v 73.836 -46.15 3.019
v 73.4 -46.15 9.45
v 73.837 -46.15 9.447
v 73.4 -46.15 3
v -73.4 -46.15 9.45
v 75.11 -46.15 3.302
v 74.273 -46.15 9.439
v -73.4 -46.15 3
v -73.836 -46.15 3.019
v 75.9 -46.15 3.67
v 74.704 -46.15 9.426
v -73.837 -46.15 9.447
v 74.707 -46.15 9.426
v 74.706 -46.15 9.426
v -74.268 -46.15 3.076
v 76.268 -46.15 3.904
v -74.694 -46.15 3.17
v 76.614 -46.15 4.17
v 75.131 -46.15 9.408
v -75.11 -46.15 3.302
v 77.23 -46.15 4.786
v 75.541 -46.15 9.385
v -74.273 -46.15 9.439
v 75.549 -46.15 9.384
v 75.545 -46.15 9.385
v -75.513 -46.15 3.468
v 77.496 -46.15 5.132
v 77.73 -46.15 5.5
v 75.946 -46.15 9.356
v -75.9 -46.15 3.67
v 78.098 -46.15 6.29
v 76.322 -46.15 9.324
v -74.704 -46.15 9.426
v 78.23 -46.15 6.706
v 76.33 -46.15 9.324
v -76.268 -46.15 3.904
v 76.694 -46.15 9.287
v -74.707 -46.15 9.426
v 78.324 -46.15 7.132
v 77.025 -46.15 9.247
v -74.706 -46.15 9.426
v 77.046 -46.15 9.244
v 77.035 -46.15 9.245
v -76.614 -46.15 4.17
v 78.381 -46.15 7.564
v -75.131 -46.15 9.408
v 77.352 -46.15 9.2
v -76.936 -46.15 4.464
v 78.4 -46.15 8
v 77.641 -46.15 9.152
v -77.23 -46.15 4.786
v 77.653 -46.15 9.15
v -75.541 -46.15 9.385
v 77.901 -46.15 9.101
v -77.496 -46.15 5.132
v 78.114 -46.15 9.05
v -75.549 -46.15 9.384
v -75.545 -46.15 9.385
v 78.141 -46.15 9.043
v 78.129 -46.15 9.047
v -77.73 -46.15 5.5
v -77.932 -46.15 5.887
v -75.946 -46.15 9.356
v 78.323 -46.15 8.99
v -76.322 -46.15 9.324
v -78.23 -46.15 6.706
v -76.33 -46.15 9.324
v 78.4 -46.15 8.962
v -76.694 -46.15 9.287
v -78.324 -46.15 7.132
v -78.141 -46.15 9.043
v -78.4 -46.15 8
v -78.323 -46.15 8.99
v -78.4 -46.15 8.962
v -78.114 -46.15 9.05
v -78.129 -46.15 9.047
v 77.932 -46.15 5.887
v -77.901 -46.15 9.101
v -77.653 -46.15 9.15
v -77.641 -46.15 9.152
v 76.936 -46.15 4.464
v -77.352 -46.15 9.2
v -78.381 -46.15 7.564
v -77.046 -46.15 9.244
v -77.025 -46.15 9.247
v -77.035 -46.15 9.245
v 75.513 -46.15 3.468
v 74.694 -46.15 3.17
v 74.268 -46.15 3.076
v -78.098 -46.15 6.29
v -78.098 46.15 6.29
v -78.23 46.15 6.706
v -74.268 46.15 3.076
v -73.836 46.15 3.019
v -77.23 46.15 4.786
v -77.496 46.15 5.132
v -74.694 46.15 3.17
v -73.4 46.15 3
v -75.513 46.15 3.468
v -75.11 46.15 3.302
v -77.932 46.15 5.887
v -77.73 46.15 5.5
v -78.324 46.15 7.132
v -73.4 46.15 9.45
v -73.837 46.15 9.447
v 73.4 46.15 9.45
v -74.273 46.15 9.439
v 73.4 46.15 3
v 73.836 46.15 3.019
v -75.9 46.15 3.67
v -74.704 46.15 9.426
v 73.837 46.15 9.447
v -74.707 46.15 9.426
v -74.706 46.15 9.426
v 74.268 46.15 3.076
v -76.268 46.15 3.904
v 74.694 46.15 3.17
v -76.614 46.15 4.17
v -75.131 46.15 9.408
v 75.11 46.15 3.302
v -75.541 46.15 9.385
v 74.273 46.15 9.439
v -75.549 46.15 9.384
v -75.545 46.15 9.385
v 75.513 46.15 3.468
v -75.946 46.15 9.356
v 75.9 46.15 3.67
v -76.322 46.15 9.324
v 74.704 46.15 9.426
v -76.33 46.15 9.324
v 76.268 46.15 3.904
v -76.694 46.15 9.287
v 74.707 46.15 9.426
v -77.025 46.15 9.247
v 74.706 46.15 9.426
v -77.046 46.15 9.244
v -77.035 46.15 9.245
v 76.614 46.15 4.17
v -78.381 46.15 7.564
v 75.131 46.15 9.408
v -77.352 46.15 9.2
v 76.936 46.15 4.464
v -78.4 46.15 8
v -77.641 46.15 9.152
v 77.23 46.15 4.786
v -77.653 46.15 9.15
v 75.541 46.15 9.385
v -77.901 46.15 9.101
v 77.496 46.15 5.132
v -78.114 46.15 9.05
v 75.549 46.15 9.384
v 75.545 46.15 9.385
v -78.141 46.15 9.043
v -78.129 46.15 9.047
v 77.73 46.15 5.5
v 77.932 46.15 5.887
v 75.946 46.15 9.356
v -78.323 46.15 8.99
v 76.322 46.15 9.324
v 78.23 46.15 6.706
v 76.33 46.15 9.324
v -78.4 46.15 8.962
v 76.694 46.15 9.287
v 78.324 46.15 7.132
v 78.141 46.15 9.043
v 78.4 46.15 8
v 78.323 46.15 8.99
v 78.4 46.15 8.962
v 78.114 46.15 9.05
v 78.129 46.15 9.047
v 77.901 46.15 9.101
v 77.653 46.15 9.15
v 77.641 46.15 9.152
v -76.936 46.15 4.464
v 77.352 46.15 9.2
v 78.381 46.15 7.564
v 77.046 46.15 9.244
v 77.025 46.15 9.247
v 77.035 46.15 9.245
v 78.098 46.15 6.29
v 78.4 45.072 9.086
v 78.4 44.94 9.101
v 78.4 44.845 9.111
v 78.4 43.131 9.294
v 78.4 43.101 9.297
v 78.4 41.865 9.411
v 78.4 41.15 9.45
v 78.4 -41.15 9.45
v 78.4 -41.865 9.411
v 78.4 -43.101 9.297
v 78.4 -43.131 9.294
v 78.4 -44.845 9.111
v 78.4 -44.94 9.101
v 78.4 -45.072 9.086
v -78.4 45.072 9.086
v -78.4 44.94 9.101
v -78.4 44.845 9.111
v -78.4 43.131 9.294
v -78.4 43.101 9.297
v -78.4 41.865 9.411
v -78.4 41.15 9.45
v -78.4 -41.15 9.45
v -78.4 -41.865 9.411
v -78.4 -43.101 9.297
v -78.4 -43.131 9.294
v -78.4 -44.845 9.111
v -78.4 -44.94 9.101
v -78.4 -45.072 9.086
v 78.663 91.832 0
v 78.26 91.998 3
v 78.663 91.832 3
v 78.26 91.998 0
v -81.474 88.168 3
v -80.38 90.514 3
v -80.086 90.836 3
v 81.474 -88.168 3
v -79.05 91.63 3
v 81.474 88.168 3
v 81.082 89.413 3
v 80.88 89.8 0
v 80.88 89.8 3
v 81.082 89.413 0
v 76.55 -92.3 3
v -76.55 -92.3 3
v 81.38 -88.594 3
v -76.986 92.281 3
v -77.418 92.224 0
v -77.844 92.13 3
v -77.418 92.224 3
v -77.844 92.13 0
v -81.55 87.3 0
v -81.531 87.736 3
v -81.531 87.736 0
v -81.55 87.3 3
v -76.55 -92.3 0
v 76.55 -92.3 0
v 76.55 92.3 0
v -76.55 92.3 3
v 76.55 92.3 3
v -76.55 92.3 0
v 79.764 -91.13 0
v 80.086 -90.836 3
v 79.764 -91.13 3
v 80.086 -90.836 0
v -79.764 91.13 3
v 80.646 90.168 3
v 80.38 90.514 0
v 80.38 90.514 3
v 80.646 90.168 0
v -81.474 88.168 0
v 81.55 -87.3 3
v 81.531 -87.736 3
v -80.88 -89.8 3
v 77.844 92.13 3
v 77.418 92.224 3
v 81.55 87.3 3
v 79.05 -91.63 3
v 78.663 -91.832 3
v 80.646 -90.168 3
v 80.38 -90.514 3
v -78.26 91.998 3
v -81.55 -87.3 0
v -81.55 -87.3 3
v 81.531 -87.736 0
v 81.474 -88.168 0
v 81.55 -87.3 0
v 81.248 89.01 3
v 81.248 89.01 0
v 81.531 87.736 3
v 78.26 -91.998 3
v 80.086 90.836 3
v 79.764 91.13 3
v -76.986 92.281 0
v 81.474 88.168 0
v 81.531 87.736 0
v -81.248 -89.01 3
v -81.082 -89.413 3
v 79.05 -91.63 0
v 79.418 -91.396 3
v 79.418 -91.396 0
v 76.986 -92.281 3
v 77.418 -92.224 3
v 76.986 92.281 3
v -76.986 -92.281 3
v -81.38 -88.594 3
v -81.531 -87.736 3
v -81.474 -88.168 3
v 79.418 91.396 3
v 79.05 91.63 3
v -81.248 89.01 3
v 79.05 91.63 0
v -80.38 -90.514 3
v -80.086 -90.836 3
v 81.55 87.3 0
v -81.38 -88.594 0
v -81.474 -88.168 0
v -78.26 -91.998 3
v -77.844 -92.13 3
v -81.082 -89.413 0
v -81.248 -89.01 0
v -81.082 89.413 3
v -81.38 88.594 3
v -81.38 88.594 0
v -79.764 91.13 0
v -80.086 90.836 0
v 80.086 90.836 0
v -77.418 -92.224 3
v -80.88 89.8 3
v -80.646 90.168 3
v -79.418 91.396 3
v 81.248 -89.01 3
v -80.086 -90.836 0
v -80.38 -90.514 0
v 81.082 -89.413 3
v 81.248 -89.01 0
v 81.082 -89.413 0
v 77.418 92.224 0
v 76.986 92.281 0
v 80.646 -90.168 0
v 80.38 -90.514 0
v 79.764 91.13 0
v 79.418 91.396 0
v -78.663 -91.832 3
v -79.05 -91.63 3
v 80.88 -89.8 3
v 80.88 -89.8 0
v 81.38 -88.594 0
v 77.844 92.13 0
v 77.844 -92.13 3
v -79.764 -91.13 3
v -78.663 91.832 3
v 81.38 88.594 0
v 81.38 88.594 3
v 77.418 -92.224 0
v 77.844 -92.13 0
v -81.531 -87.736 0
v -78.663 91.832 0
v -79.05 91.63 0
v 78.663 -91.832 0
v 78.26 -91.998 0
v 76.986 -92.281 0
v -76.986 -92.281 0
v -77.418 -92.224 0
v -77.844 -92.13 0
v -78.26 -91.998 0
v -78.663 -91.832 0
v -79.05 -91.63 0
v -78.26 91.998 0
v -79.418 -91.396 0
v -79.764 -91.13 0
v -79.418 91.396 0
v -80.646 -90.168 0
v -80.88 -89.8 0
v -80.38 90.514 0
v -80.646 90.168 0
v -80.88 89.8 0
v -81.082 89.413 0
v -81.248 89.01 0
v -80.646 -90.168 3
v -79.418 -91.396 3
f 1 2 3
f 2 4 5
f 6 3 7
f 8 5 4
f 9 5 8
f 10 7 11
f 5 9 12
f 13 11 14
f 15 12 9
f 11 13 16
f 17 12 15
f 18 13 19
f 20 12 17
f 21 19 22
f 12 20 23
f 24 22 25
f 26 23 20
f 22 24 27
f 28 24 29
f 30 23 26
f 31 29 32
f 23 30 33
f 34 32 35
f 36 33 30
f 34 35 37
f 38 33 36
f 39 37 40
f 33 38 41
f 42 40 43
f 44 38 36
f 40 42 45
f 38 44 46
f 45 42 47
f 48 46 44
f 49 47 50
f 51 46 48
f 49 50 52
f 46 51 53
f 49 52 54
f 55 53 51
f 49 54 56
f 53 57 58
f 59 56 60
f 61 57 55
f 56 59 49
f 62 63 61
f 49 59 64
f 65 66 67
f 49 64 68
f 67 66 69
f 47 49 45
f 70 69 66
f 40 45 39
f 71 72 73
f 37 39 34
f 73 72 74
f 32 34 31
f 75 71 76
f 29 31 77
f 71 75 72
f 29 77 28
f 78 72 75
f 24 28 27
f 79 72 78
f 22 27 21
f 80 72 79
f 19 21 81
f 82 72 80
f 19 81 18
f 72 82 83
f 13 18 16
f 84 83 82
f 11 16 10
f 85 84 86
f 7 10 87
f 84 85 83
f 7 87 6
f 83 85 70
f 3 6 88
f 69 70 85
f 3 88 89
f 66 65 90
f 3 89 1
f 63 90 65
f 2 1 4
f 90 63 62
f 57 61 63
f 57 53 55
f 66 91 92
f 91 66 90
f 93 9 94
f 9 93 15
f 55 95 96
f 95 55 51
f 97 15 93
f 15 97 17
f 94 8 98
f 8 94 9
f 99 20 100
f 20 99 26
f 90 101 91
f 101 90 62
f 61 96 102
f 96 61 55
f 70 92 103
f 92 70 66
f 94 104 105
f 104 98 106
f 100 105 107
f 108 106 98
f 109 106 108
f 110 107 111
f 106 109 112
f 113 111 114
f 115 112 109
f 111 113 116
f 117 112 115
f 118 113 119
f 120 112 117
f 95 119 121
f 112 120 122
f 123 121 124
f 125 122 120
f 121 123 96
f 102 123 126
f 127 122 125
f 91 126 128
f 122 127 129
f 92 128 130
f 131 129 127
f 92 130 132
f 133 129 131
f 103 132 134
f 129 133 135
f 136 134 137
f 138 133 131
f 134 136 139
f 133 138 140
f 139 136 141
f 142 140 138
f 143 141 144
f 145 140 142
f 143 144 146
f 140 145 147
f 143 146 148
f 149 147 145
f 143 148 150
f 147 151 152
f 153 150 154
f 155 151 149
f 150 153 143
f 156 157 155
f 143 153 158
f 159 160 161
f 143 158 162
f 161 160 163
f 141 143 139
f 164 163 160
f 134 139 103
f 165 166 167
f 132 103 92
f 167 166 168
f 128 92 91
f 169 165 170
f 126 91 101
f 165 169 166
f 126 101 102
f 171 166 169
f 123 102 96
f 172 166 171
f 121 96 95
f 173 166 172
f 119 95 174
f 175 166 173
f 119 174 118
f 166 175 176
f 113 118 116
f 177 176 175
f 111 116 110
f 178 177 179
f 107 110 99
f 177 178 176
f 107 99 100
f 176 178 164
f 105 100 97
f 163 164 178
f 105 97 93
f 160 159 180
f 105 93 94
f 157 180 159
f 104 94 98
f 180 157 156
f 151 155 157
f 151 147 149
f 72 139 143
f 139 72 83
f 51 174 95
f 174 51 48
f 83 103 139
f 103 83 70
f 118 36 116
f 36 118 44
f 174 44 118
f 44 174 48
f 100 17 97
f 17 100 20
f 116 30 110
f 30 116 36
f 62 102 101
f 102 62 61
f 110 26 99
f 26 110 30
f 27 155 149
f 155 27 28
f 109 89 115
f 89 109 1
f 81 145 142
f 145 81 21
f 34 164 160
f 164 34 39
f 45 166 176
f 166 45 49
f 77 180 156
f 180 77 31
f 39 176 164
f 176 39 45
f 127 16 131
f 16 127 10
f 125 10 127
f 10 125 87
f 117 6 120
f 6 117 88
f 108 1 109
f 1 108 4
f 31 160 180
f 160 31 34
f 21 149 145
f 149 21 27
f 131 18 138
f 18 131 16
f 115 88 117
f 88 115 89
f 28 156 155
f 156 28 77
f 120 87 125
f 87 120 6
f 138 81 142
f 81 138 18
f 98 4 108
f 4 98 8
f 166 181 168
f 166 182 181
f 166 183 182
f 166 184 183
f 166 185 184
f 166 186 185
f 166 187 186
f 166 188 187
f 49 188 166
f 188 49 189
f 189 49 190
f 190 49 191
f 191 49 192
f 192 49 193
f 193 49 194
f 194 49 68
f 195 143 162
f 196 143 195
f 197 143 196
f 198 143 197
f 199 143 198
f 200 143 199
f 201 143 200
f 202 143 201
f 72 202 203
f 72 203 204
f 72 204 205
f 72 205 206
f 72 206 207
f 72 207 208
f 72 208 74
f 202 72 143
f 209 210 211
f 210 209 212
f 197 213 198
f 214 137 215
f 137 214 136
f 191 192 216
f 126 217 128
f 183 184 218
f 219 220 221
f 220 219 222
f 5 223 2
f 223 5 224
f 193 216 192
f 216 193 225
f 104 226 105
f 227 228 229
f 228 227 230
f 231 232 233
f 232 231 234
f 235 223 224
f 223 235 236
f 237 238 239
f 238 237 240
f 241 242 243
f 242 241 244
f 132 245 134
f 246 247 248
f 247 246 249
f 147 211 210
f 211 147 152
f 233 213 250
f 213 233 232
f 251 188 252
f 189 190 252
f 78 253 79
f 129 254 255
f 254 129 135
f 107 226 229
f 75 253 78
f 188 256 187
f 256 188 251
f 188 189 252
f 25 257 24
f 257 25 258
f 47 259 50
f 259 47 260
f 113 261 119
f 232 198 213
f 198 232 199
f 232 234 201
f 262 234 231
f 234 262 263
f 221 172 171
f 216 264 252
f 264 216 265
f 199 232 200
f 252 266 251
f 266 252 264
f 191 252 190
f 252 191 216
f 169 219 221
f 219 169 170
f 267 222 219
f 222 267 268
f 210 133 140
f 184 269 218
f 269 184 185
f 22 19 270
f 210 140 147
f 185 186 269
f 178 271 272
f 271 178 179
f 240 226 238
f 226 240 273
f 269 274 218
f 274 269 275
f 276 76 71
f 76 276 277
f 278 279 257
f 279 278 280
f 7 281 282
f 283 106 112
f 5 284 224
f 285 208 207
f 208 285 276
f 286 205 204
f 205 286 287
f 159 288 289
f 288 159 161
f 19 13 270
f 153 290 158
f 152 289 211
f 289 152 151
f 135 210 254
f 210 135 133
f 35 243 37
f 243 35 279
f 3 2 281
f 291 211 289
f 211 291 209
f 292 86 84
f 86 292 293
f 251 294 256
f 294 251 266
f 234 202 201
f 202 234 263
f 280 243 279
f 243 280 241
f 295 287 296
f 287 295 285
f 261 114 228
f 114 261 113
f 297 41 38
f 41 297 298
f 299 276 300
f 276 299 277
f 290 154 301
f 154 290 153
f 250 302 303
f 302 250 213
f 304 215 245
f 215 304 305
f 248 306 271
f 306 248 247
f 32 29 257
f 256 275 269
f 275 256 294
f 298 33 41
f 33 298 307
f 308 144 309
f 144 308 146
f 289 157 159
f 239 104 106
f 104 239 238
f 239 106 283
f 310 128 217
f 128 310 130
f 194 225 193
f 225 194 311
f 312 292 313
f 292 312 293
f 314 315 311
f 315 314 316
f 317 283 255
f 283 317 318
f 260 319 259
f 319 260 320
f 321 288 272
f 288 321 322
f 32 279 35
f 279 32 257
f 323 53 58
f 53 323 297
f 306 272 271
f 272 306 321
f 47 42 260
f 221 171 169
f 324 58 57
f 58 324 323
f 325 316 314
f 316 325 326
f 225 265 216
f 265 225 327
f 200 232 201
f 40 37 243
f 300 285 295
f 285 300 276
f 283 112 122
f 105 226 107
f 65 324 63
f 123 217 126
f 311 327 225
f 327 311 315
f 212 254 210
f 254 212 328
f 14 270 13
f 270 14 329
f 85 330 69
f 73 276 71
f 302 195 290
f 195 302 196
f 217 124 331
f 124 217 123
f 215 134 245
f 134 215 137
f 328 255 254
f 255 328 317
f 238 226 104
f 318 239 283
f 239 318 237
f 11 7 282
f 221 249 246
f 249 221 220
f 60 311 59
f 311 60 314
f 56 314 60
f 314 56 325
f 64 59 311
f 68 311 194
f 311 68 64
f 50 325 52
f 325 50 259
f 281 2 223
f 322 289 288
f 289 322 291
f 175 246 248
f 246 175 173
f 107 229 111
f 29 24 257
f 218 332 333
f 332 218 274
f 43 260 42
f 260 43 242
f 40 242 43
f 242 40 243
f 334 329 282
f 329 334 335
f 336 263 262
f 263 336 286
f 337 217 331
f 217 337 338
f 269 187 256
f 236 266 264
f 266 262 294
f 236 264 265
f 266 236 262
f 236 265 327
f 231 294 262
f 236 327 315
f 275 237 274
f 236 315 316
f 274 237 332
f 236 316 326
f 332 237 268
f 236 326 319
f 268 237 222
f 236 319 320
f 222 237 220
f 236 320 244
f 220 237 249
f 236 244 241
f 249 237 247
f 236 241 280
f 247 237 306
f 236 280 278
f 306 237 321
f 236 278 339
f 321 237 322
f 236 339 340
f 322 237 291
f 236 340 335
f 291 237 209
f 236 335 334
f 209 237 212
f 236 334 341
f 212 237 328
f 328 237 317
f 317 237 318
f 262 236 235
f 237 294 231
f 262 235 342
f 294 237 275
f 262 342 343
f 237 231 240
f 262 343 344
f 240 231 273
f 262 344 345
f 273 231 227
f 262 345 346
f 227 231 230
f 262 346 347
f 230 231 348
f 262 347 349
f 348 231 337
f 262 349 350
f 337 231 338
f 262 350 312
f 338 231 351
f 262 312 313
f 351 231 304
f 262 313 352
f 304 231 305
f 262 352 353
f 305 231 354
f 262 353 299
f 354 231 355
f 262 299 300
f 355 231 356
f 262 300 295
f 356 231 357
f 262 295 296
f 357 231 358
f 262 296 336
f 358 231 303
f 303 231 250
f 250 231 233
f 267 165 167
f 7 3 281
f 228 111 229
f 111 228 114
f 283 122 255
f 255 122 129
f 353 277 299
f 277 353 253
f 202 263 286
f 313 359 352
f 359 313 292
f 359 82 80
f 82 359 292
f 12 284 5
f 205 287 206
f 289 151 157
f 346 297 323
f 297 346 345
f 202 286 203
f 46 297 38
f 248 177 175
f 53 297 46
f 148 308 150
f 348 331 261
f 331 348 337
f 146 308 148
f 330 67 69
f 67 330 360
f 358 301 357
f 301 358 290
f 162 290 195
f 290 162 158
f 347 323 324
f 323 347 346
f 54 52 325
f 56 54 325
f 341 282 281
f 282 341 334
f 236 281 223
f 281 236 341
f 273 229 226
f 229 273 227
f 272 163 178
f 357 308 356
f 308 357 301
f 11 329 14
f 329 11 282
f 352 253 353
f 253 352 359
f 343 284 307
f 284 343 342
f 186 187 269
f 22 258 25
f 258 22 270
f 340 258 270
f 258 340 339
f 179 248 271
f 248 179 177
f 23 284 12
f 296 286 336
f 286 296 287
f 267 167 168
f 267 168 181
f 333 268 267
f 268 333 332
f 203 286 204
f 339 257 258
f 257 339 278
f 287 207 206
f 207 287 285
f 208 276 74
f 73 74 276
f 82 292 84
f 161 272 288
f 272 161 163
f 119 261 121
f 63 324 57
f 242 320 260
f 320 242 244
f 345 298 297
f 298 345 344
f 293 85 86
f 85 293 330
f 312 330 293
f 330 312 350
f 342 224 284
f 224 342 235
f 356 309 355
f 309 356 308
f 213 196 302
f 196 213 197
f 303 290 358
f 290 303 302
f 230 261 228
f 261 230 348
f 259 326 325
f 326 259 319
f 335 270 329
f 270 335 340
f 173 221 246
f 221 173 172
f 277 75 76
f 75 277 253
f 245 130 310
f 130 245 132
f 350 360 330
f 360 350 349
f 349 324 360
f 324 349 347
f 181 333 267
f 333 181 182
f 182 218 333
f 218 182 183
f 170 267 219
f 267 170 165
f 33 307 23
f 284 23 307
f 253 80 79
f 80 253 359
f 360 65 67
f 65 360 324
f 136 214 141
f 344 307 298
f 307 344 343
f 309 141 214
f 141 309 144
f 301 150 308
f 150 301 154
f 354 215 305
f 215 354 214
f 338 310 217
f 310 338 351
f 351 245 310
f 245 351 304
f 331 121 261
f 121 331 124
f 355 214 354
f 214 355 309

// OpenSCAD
/*
    A Base for Radio Mounting Tower for Ham Radios
    Author: porcej@gmail.com
    Date: November 6, 2017

*/

// Arbitrary dimensions
thickness = 3; // Thicknesses of walls, etc.
quality=72; // "Roundness" of circles.
tolerances = 0.15; // Something to add for shrinkage
compensate = .6; // Multiplier "fudging" constant for shrinkage compensation
corner_radius = 5; // radius of tower's corners

// Screw dimensions
m4 = 4 + (2 * (tolerances + compensate)); // Diameter of M4 screw shaft
m5 = 5 + (2 * (tolerances + compensate)); // Diameter of M5 screw shaft
// Radio dimensions
radio_count = 2; // Number of radios on tower
radio_width = 150.5; // Width of radio
radio_height = 39.5; // Height of radio
radio_screw_spaceing = 50; // Spaceing between mounting screws on radio

// Tower Dimensions
tower_width = radio_width + (2 * (tolerances + thickness)); // Overall width od tower (X)
tower_height = radio_count * (1.75 * (radio_height + tolerances)) + (2 * thickness); // Overall height of tower (Y)
tower_depth = (1.5 * radio_screw_spaceing) + (2 * (thickness + tolerances + m4)); // Depth of tower (Z)

// Base Dimensions
base_depth = 2 * tower_depth;
base_height = 3 * (tolerances + thickness);
base_width = tower_width + 2 * (tolerances + thickness);


include <MCAD/boxes.scad>
$fn = quality;

difference(){
    towerBase();
    translate([0,0,thickness + tower_height / 2]) rotate([90,0,0]) solidRadioTower();
}   // end of difference

module towerBase(){
    hull(){
        translate([0,0,thickness / 2])
            roundedBox([base_width, base_depth, thickness], corner_radius, true);
        translate([0,0, base_height / 2])
            roundedBox([tower_width, tower_depth, base_height], corner_radius, true);
    }   // end of hull
    
}   // towerBase();

module solidRadioTower(){    
    roundedBox([tower_width, tower_height, tower_depth], corner_radius, true);
}   // solidRadioTower()



module radioTower(){    
    difference(){
        // First we create the tower has a box with rounded corners
        solidRadioTower();
        
        
        base_offset = -tower_height / 2 + thickness;   
        
        // Loop over all of the radio bays to add mounting screw holes
        for (radio = [0:radio_count-1]) {
            mounting_hole_y = base_offset + ((1 + 1.5 * radio) * (radio_height + tolerances));
            // Then we cut out the rear screw holes
            translate([0,mounting_hole_y,-radio_screw_spaceing / 2])
            rotate([0,90,0])
            cylinder(h=tower_width, r=m4 / 2, center=true);
            
            // Next the front screw "trench"
            translate([0,mounting_hole_y,radio_screw_spaceing / 2])
            rotate([0,90,0])
            hull(){
                translate([-radio_screw_spaceing / 8,0,0]) cylinder(h=tower_width, r=m4 / 2, center=true);
                translate([radio_screw_spaceing / 8,0,0]) cylinder(h=tower_width, r=m4 / 2, center=true);
            }   // end of hull
        }   // end of for
        
        // Remove the top and bottom mounting bracket slots
        rotate([90,0,0]) cylinder(h=tower_height, r=m5/2, center=true); 
        translate([-radio_width/4,0,-tower_height/4]) mountingSlots();
        translate([-radio_width/4,0,tower_height/4]) mountingSlots();
        translate([radio_width/4,0,-tower_height/4]) mountingSlots();
        translate([radio_width/4,0,tower_height/4]) mountingSlots();
        
        // Next we create the inner box and remove it from the outterbox
        roundedBox([tower_width - (2 * thickness), tower_height - ( 2 * thickness), tower_depth], corner_radius, true);
    }   // end of difference
}   // radioTower()


module mountingSlots(){
    rotate([90,0,0])
    hull(){ 
        translate([-radio_width/10,0,0])
            cylinder(h=tower_height, r=m5/2, center=true);
        translate([radio_width/10,0,0])
            cylinder(h=tower_height, r=m5/2, center=true);
    }
}   // mountSlots()
